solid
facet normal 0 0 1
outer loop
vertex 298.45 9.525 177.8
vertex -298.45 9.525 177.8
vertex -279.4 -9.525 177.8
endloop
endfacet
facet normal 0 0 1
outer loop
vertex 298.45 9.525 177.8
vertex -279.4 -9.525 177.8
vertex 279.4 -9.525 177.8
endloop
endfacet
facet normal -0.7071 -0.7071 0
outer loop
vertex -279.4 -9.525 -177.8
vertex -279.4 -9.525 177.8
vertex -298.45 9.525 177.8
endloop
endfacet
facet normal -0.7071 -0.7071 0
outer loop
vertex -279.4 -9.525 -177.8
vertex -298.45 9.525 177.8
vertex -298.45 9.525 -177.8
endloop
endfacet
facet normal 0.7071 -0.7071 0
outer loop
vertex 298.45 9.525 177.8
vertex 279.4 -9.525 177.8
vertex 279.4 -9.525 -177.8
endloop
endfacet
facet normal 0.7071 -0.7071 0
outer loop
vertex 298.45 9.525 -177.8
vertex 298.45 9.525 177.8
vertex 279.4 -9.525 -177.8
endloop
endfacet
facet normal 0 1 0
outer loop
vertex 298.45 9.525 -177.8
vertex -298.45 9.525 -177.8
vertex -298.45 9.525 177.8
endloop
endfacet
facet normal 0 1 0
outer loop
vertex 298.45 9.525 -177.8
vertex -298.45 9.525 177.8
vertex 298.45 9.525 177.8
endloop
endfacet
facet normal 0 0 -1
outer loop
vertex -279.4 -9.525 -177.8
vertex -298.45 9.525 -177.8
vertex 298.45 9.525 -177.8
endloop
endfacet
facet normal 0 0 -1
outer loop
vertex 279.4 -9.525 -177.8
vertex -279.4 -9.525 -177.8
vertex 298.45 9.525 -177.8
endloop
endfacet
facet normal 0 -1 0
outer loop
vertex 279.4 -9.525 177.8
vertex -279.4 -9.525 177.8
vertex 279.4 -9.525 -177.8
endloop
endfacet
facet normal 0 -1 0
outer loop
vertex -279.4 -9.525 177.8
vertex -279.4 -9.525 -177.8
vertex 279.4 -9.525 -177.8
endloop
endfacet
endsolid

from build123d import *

# Parameters (mm, degrees)
SKETCH1_W           = 596.9
SKETCH1_H           = 355.6
BOSS_EXTRUDE1_DEPTH = 9.525
CHAMFER1_SIZE       = 19.05


with BuildPart() as part:
    # Sketch1 → Boss-Extrude1 (new, symmetric)
    with BuildSketch(Plane(origin=(0, 0, 0), x_dir=(1, 0, 0), z_dir=(0, 1, 0))):
        Rectangle(SKETCH1_W, SKETCH1_H)
    extrude(amount=BOSS_EXTRUDE1_DEPTH, both=True)

    # Chamfer1
    chamfer1_edges = [part.edges().sort_by_distance(p)[0] for p in [
        (298.45, -9.525, 0),
        (-298.45, -9.525, 0),
    ]]
    chamfer(chamfer1_edges, length=CHAMFER1_SIZE - 0.0001)  # a hair under: the kernel refuses the full size


solid = part.part
